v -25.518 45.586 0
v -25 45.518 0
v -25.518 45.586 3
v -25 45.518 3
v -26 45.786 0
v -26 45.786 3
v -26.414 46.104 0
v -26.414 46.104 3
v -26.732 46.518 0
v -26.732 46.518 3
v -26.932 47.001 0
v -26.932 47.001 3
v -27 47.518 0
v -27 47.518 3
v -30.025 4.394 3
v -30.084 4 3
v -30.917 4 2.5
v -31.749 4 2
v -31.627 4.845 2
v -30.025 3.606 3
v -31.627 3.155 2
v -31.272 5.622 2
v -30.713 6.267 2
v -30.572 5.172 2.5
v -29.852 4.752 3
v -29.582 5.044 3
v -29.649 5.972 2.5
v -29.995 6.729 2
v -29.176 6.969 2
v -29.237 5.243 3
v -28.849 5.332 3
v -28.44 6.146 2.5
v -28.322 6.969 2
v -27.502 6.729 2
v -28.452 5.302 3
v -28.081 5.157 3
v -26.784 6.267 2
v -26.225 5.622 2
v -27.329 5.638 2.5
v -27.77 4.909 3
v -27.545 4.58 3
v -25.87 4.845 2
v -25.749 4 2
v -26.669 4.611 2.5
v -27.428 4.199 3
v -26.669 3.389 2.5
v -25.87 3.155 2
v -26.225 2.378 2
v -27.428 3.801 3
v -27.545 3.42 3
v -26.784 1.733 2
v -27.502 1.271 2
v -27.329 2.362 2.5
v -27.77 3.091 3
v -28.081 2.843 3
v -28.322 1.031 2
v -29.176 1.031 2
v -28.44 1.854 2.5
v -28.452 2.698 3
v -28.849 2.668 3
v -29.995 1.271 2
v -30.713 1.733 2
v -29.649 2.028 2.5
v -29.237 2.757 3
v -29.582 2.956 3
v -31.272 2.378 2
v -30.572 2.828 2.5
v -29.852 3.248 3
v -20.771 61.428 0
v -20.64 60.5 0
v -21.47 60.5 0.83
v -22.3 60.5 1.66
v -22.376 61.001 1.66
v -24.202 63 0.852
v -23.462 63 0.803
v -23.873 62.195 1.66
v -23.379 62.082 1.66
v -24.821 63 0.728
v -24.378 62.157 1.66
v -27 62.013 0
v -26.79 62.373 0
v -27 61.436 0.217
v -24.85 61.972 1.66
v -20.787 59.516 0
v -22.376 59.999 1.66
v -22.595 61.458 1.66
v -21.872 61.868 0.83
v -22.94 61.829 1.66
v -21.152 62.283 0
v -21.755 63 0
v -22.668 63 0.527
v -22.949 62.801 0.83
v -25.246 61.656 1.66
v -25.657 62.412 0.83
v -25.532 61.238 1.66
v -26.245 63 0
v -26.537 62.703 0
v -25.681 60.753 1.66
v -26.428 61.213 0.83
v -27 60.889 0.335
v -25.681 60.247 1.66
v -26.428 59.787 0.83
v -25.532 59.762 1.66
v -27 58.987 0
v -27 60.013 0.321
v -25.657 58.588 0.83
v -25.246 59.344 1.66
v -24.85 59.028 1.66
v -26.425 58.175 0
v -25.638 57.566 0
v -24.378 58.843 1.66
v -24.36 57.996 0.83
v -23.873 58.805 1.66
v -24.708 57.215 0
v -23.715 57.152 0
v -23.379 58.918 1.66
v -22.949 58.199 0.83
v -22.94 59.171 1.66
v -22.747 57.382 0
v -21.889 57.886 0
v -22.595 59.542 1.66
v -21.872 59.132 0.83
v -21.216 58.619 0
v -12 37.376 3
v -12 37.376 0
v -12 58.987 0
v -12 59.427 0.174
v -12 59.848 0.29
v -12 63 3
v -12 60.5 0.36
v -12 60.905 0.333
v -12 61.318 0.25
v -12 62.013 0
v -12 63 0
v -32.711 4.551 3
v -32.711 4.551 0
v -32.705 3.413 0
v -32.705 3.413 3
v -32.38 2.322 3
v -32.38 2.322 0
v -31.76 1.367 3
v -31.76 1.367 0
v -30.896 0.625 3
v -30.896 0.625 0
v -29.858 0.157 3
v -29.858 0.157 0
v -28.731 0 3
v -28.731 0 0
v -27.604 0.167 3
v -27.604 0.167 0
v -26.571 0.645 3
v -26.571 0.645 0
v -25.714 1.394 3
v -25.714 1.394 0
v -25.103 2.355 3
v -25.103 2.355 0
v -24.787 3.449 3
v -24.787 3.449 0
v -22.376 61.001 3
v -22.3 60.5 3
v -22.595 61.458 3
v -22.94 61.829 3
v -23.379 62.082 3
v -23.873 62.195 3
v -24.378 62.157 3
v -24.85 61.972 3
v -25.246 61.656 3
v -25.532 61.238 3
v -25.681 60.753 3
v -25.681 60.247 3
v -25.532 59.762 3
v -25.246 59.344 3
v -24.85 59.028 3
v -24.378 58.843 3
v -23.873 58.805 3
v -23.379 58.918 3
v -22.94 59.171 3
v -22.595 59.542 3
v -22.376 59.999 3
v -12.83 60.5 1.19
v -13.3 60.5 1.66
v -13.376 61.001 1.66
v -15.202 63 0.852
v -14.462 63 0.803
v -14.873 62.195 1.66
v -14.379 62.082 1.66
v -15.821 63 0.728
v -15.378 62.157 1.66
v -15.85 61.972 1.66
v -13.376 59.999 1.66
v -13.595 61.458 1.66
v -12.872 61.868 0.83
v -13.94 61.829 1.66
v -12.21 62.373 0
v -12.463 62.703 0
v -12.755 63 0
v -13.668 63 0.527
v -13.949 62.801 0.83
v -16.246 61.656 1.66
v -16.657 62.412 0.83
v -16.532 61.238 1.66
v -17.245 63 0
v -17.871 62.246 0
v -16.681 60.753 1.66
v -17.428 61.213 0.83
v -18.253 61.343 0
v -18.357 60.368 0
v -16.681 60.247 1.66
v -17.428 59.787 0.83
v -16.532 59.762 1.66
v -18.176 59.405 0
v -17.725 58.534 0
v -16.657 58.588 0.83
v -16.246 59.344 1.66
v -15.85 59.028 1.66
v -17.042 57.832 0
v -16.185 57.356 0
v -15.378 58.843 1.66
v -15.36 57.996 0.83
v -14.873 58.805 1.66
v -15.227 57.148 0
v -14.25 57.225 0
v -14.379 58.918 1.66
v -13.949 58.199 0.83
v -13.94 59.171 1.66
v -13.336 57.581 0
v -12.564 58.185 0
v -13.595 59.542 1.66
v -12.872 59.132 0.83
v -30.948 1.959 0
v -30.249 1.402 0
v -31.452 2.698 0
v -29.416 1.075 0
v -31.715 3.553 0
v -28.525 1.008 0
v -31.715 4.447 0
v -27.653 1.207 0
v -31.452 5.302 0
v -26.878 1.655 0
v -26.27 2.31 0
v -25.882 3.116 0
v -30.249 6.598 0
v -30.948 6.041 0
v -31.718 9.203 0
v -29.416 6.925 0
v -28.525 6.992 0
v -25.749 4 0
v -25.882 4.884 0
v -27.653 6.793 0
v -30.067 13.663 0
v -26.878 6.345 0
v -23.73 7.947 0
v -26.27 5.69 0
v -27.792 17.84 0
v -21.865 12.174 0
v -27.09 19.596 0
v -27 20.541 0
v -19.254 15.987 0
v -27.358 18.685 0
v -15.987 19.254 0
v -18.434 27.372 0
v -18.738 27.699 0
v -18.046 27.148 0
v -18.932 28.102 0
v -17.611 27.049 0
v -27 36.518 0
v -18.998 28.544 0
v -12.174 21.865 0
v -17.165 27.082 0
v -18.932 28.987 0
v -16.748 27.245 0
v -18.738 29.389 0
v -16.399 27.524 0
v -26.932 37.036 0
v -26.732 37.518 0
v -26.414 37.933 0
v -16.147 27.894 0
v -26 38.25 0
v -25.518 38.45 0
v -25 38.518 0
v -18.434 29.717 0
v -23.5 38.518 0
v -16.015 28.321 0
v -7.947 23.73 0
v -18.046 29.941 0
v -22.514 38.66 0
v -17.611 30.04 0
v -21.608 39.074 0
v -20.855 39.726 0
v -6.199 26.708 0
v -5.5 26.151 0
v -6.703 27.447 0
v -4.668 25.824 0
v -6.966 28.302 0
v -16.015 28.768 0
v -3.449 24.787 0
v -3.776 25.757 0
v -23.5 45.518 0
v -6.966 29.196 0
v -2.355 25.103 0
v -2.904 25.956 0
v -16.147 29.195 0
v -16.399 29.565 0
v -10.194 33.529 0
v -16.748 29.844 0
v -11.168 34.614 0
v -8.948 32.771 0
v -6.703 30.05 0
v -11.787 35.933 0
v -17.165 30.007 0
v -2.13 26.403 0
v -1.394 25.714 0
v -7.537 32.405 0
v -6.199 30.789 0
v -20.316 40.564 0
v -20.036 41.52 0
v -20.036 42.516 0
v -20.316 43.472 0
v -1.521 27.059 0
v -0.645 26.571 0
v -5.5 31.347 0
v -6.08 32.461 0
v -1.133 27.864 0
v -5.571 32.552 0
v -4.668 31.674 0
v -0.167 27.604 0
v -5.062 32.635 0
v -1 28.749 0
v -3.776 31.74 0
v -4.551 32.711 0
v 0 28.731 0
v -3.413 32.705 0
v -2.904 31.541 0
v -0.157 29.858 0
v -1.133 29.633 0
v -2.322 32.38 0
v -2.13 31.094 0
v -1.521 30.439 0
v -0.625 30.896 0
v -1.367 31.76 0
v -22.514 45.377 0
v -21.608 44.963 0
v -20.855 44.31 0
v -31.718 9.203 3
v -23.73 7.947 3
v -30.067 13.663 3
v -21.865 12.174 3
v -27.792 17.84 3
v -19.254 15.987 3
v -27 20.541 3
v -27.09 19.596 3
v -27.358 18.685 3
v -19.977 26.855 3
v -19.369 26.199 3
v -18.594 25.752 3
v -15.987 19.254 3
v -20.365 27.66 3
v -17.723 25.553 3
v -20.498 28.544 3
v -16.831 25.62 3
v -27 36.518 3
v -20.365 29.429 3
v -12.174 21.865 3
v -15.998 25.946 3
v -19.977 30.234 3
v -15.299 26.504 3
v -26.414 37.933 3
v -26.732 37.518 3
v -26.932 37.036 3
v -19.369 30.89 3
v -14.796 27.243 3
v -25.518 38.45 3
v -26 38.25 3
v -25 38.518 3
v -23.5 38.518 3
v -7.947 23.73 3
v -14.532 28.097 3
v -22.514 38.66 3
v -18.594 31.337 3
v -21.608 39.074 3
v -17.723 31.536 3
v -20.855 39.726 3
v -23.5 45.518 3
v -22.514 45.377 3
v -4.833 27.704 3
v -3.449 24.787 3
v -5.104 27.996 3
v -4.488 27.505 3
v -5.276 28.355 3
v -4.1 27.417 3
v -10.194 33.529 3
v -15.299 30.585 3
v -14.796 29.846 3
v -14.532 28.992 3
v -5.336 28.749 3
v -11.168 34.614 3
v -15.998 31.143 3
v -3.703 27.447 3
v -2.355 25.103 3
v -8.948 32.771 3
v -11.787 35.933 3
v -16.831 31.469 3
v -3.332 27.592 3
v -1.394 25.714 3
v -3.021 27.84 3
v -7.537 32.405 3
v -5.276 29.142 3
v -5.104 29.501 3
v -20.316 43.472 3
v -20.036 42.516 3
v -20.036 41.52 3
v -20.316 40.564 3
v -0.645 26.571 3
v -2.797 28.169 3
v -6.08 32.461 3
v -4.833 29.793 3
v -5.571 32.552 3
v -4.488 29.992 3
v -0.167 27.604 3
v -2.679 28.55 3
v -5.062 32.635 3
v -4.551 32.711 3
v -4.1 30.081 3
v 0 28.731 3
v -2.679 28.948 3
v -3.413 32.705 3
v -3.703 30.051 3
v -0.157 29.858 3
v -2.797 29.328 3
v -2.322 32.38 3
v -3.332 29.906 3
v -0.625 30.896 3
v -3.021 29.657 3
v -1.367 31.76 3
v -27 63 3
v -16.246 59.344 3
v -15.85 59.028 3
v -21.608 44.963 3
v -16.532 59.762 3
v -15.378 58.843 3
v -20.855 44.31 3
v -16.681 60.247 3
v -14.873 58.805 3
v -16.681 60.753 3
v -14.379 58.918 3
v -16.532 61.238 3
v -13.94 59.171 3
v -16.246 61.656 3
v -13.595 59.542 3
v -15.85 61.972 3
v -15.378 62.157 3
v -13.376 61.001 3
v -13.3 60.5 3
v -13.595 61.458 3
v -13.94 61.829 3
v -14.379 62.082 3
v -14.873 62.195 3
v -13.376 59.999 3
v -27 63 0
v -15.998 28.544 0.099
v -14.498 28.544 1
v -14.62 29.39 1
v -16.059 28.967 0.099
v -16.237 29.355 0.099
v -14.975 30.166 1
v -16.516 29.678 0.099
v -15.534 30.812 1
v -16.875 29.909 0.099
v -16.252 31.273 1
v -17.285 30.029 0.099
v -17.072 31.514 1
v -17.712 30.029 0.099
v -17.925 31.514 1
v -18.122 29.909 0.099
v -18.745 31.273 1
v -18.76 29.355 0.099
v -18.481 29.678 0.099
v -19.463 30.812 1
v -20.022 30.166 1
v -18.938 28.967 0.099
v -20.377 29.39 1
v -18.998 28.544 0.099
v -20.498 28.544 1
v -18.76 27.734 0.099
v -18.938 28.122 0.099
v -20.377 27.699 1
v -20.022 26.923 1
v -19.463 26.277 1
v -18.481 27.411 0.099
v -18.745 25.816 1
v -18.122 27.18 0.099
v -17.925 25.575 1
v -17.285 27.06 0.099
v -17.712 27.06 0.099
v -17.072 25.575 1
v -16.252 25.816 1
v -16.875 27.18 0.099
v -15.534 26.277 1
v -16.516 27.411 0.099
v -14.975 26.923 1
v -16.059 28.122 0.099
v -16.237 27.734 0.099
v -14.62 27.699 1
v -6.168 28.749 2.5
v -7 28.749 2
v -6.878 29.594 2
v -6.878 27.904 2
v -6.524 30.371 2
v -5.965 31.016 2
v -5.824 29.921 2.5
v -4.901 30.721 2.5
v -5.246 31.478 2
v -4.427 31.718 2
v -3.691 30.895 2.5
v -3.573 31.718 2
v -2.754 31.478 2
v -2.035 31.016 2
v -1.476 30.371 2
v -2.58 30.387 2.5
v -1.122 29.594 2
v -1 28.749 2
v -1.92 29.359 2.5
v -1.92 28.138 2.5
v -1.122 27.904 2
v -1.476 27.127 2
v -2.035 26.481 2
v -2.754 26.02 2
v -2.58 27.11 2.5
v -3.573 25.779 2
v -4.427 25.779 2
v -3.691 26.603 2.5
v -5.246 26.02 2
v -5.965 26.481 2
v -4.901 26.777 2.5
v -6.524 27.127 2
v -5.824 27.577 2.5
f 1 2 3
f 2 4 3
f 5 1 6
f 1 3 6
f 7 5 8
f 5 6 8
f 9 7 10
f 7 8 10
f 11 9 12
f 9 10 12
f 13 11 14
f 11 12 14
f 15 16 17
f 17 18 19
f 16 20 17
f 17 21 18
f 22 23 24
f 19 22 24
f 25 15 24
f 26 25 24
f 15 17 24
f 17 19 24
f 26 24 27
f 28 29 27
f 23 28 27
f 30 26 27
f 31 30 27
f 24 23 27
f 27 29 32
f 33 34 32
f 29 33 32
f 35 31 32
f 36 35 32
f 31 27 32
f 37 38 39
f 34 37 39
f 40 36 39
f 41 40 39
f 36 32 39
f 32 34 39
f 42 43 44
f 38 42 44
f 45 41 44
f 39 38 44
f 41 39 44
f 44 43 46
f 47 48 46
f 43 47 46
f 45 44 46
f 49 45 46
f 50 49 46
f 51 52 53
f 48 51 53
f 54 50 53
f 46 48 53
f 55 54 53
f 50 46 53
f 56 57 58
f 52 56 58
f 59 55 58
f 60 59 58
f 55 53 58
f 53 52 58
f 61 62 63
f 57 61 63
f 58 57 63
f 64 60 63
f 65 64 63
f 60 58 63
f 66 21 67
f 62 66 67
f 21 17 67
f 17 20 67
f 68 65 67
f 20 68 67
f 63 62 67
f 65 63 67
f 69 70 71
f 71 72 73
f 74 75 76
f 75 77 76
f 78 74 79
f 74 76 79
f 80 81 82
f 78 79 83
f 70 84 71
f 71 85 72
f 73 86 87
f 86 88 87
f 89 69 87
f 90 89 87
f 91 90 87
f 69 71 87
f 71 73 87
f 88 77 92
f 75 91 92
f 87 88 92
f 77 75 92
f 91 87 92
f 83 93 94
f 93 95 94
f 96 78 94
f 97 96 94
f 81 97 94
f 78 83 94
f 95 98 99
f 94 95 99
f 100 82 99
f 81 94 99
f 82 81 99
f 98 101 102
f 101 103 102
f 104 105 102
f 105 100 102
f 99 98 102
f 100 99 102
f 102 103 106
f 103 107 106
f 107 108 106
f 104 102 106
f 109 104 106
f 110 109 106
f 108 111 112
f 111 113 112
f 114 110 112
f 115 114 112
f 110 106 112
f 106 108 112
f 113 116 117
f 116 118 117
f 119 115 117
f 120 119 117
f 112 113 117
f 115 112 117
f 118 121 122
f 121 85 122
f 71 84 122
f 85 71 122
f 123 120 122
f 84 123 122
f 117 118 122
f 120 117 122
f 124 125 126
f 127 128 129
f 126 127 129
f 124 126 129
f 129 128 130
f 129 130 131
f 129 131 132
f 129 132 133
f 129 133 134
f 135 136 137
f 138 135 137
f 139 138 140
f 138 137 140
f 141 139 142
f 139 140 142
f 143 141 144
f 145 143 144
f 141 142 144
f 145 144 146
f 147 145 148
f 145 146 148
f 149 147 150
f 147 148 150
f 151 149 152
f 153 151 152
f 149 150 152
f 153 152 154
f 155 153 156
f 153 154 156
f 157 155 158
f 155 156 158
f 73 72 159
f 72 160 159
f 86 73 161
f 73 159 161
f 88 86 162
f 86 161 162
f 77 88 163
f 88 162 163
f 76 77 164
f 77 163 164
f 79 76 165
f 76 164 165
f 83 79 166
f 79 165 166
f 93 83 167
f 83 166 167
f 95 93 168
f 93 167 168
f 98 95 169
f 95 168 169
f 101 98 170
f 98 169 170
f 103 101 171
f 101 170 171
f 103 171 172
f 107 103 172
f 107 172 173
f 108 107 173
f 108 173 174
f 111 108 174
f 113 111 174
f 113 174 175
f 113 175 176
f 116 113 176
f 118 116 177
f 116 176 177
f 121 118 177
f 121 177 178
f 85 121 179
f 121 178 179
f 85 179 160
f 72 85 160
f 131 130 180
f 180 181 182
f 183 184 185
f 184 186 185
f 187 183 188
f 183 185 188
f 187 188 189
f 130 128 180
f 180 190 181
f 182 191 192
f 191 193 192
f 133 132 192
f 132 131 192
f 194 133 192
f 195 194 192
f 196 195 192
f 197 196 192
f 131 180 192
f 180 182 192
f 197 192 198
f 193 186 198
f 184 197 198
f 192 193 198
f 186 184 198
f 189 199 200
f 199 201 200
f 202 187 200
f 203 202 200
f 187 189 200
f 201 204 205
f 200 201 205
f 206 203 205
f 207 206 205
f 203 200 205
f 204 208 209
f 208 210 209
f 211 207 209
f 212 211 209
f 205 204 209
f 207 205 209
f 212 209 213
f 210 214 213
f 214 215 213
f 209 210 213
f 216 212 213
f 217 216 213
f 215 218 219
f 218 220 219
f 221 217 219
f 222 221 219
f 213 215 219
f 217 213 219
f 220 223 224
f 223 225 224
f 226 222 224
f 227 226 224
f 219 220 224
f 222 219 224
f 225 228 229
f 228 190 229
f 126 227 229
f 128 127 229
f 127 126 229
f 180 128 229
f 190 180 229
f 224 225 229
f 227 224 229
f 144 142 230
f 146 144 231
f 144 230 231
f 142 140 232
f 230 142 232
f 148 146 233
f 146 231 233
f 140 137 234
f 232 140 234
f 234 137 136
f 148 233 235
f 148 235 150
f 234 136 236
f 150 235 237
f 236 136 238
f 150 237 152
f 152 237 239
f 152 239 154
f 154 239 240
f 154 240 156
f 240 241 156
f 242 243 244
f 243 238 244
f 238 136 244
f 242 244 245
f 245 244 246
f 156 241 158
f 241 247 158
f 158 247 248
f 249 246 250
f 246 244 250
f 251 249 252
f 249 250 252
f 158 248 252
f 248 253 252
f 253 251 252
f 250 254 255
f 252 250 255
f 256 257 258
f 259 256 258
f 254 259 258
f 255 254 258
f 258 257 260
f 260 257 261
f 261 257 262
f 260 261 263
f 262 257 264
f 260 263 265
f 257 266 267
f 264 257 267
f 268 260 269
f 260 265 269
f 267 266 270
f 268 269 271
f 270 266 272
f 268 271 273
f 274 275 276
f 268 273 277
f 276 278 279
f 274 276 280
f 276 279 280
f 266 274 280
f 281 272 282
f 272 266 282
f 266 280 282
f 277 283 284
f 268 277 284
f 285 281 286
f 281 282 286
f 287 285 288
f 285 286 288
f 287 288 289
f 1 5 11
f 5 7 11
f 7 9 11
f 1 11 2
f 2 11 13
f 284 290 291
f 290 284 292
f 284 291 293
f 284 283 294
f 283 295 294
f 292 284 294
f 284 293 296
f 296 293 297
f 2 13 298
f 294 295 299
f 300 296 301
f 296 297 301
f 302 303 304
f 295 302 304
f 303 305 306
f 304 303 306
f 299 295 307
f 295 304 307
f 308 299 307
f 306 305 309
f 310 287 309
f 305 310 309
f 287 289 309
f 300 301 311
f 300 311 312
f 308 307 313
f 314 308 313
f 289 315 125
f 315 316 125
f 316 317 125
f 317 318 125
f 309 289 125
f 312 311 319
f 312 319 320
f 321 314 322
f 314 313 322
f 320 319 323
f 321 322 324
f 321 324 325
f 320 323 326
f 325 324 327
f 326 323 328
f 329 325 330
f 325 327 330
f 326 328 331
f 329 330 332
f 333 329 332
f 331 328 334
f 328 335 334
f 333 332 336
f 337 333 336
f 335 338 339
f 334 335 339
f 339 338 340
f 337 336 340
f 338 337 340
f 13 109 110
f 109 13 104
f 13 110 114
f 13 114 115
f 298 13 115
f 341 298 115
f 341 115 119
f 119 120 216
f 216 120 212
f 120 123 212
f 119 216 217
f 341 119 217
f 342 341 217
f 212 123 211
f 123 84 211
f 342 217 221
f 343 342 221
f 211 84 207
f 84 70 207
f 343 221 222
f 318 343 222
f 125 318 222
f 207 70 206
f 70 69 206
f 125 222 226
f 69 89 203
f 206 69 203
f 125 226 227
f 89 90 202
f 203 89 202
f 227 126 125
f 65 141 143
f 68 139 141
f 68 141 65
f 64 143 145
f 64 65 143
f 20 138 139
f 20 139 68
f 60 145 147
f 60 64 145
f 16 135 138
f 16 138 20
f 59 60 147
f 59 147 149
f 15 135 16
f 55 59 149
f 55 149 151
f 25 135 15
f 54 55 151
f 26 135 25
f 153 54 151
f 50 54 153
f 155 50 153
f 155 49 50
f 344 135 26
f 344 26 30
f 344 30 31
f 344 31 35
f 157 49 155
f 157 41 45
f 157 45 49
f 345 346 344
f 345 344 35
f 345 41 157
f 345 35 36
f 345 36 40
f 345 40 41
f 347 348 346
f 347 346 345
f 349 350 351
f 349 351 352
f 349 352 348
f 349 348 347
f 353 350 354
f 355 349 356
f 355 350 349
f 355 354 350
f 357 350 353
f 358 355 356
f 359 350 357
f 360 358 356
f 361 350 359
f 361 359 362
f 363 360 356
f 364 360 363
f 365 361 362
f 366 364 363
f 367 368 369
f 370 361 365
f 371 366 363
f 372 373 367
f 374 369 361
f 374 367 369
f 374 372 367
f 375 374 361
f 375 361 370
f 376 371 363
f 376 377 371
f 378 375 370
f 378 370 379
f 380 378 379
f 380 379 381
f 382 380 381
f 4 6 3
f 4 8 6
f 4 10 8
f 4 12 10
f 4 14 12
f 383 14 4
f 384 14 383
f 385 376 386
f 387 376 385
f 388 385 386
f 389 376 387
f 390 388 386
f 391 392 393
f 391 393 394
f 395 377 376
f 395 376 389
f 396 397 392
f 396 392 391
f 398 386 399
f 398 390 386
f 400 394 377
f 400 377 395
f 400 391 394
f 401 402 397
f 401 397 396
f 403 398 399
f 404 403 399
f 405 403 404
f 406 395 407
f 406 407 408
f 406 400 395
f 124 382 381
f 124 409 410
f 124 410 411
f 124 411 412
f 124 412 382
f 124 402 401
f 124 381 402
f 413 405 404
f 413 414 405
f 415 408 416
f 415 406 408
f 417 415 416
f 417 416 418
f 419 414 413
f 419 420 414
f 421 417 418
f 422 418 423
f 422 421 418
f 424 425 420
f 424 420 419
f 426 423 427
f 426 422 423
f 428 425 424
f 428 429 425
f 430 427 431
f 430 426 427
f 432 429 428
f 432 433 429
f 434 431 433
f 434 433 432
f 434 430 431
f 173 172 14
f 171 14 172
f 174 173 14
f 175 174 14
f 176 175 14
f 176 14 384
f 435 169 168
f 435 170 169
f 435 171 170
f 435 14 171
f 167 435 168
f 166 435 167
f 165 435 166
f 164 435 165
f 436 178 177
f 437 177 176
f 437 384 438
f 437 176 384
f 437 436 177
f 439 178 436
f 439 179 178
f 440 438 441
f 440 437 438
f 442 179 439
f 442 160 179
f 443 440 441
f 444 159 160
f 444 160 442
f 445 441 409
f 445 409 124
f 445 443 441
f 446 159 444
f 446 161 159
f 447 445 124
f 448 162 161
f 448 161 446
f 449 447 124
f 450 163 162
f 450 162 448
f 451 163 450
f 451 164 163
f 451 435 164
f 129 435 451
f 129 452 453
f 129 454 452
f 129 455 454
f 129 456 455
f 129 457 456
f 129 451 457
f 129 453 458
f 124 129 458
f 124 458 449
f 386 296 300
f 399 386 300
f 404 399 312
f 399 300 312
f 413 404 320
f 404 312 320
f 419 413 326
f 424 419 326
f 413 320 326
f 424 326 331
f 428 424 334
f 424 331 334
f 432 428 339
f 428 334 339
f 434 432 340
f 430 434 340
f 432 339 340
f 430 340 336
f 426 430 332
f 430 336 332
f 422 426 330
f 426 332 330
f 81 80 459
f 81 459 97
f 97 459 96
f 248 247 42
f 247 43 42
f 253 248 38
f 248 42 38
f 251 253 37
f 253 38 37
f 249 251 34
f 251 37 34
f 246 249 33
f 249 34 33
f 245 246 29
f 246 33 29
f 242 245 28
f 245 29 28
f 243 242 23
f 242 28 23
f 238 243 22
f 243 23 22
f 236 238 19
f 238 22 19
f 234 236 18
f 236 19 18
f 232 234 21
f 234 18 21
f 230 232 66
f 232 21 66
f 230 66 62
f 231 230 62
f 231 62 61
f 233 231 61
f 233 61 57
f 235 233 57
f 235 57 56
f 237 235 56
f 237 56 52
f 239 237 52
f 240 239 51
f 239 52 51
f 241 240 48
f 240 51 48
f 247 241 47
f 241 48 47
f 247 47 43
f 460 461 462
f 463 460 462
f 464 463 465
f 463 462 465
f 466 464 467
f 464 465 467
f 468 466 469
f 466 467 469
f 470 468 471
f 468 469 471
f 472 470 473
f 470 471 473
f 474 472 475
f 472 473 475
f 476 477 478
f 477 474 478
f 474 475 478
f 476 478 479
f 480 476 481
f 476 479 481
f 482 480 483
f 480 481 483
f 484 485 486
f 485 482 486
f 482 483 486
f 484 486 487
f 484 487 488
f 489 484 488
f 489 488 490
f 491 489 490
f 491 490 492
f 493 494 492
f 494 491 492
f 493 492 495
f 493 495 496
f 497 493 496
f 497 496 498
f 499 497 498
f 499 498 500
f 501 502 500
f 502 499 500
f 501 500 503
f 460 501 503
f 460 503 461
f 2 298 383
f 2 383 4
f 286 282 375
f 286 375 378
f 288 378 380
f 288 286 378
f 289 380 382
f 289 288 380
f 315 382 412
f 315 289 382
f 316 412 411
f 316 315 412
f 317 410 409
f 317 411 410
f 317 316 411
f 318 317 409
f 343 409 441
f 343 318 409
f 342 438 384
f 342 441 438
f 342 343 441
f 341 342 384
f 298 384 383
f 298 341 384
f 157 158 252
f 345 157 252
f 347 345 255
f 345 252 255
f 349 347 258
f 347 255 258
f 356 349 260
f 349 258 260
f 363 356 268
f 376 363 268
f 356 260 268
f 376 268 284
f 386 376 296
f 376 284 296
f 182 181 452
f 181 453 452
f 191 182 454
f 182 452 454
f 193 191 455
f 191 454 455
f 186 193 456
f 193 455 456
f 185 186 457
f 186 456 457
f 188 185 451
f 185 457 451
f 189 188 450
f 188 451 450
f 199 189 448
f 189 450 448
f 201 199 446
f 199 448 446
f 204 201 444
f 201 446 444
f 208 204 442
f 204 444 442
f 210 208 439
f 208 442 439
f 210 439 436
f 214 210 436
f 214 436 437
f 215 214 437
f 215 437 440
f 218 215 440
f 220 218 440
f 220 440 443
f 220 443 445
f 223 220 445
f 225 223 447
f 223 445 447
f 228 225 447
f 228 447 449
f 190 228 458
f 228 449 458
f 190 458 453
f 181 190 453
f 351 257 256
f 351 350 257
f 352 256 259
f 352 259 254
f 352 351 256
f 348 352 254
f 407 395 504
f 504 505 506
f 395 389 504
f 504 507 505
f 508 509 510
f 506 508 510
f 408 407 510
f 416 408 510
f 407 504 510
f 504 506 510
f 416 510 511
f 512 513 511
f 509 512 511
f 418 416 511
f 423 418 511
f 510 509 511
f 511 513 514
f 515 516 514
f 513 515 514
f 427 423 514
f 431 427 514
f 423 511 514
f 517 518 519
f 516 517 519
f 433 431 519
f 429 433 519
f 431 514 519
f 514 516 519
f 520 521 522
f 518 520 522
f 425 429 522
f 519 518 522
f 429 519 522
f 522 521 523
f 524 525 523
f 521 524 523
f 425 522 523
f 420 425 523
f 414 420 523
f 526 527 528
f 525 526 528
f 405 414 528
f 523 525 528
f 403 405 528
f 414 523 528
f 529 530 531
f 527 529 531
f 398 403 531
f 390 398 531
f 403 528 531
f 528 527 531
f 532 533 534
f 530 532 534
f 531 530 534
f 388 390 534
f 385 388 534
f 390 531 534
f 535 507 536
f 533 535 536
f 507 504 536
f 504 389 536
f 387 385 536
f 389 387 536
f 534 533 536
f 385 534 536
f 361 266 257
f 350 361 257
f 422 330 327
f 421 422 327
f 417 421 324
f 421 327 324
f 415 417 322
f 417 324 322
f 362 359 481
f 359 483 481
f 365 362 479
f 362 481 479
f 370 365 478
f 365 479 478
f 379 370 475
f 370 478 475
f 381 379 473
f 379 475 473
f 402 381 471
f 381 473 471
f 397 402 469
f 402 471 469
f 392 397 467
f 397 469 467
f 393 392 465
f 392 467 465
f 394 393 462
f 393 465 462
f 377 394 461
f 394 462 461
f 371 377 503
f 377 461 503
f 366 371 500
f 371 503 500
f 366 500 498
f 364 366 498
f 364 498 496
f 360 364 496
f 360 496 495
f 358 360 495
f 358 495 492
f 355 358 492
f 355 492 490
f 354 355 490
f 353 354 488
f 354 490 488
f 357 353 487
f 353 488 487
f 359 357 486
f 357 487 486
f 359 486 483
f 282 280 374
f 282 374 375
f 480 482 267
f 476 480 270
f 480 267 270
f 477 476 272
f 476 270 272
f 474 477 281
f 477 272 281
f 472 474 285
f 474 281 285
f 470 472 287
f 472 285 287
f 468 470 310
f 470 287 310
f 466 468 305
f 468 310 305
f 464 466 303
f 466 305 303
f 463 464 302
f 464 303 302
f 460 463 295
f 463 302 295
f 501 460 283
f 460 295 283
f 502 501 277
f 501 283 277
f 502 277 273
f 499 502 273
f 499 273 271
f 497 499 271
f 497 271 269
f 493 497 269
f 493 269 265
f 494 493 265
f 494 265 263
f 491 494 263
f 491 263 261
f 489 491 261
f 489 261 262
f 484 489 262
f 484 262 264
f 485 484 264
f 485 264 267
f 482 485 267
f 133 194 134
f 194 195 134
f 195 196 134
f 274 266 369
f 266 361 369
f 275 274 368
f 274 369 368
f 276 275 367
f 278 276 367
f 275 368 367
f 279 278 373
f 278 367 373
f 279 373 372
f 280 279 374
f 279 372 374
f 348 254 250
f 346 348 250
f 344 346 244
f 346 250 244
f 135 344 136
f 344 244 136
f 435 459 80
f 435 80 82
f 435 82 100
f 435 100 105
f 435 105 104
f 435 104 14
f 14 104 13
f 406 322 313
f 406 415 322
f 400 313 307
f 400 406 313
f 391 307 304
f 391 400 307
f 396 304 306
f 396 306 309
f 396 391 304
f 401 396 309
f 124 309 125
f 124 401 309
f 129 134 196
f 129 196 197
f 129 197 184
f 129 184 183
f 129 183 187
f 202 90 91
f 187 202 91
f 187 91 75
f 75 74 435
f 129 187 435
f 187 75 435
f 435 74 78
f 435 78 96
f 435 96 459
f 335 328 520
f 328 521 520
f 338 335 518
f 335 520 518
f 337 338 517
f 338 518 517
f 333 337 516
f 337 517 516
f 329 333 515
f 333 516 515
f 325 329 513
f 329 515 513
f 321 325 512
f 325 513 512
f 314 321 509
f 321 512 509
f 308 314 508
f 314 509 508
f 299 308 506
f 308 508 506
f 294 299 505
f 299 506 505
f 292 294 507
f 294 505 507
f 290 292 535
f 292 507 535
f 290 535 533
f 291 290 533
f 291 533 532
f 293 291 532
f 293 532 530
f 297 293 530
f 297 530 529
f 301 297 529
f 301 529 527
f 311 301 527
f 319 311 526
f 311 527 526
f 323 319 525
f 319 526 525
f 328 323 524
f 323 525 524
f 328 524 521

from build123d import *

# Parameters (mm, degrees)
RESSALTO_EXTRUS_O1_DEPTH                = 3
BROCA_DE_ROSQUEAR_PARA_TARRAXA_DE_M31_D = 2.5
FURO_DE_DI_METRO_6_0_6_1_D              = 6
FURO_DE_DI_METRO_6_0_6_1_DEPTH          = 2
FURO_DE_DI_METRO_6_0_6_1_TIP            = 1.802581857
ESCAREADO_PARA_SFHCS_M31_D              = 3.4
ESCAREADO_PARA_SFHCS_M31_DEPTH          = 10
ESCAREADO_PARA_SFHCS_M31_CSINK_D        = 6.72
ESCAREADO_PARA_SFHCS_M31_CSINK_ANGLE    = 90
ESCAREADO_PARA_SFHCS_M31_TIP            = 1.021463052
ESBO_O10_R                              = 1.5
CORTE_EXTRUS_O1_DEPTH                   = 72.066727781
FILETE1_R                               = 2
FILETE2_R                               = 5
FURO_DE_DI_METRO_6_0_6_2_D              = 6
FURO_DE_DI_METRO_6_0_6_2_DEPTH          = 2
FURO_DE_DI_METRO_6_0_6_2_TIP            = 1.802581857


with BuildPart() as part:
    # Esboço1 → Ressalto-extrusão1 (new body)
    with BuildSketch(Plane.XY):
        with BuildLine():
            Line((-12, 30.768414179), (-12, 63))
            Line((-12, 63), (-27, 63))
            Line((-27, 63), (-27, 19.018288858))
            ThreePointArc((-27, 19.018288858), (-30.719082421, 12.125728279), (-32.710572622, 4.551236075))
            ThreePointArc((-32.710572622, 4.551236075), (-29.299973416, 0.038164719), (-24.786902061, 3.448763925))
            ThreePointArc((-24.786902061, 3.448763925), (-17.695825587, 17.695825587), (-3.448763925, 24.786902061))
            ThreePointArc((-3.448763925, 24.786902061), (-0.038164719, 29.299973416), (-4.551236075, 32.710572622))
            ThreePointArc((-4.551236075, 32.710572622), (-8.332397539, 31.957259931), (-12, 30.768414179))
        make_face()
    extrude(amount=RESSALTO_EXTRUS_O1_DEPTH)

    # Broca de rosquear para tarraxa de M31 (through all)
    with Locations(Plane.XY.offset(3)):
        with Locations((-28.748737342, 4), (-4, 28.748737342)):
            Hole(BROCA_DE_ROSQUEAR_PARA_TARRAXA_DE_M31_D / 2)

    # Furo de diâmetro Ø6.0 (6)1
    with Locations(Plane(origin=(0, 0, 0), x_dir=(-1, 0, 0), z_dir=(0, 0, -1))):
        with Locations((28.748737342, 4), (4, 28.748737342)):
            Hole(FURO_DE_DI_METRO_6_0_6_1_D / 2, depth=FURO_DE_DI_METRO_6_0_6_1_DEPTH)
            with Locations((0, 0, -(FURO_DE_DI_METRO_6_0_6_1_DEPTH + FURO_DE_DI_METRO_6_0_6_1_TIP / 2))):  # 118° drill point
                Cone(0, FURO_DE_DI_METRO_6_0_6_1_D / 2, FURO_DE_DI_METRO_6_0_6_1_TIP, mode=Mode.SUBTRACT)

    # Escareado para SFHCS M31
    with Locations(Plane(origin=(0, 0, 0), x_dir=(-1, 0, 0), z_dir=(0, 0, -1))):
        with Locations((15, 60.5), (24, 60.5)):
            CounterSinkHole(ESCAREADO_PARA_SFHCS_M31_D / 2, ESCAREADO_PARA_SFHCS_M31_CSINK_D / 2, depth=ESCAREADO_PARA_SFHCS_M31_DEPTH, counter_sink_angle=ESCAREADO_PARA_SFHCS_M31_CSINK_ANGLE)
            with Locations((0, 0, -(ESCAREADO_PARA_SFHCS_M31_DEPTH + ESCAREADO_PARA_SFHCS_M31_TIP / 2))):  # 118° drill point
                Cone(0, ESCAREADO_PARA_SFHCS_M31_D / 2, ESCAREADO_PARA_SFHCS_M31_TIP, mode=Mode.SUBTRACT)

    # Esboço10 → Corte-extrusão1 (cut, through all)
    with BuildSketch(Plane(origin=(0, 0, 0), x_dir=(-1, 0, 0), z_dir=(0, 0, -1))):
        with Locations((17.498454448, 28.544464197)):
            Circle(ESBO_O10_R)
        with BuildLine():
            Line((23.5, 45.518288858), (27, 45.518288858))
            Line((27, 45.518288858), (27, 38.518288858))
            Line((27, 38.518288858), (23.5, 38.518288858))
            ThreePointArc((23.5, 38.518288858), (20, 42.018288858), (23.5, 45.518288858))
        make_face()
    extrude(amount=-CORTE_EXTRUS_O1_DEPTH, mode=Mode.SUBTRACT)

    # Filete1
    filete1_edges = [part.edges().sort_by_distance(p)[0] for p in [
        (-27, 45.518288858, 1.5),
        (-27, 38.518288858, 1.5),
    ]]
    fillet(filete1_edges, radius=FILETE1_R)

    # Filete2
    filete2_edges = [part.edges().sort_by_distance(p)[0] for p in [
        (-27, 19.018288858, 1.5),
        (-12, 30.768414179, 1.5),
    ]]
    fillet(filete2_edges, radius=FILETE2_R)

    # Furo de diâmetro Ø6.0 (6)2
    with Locations(Plane.XY.offset(3)):
        with Locations((-17.498454448, 28.544464197)):
            Hole(FURO_DE_DI_METRO_6_0_6_2_D / 2, depth=FURO_DE_DI_METRO_6_0_6_2_DEPTH)
            with Locations((0, 0, -(FURO_DE_DI_METRO_6_0_6_2_DEPTH + FURO_DE_DI_METRO_6_0_6_2_TIP / 2))):  # 118° drill point
                Cone(0, FURO_DE_DI_METRO_6_0_6_2_D / 2, FURO_DE_DI_METRO_6_0_6_2_TIP, mode=Mode.SUBTRACT)


solid = part.part
